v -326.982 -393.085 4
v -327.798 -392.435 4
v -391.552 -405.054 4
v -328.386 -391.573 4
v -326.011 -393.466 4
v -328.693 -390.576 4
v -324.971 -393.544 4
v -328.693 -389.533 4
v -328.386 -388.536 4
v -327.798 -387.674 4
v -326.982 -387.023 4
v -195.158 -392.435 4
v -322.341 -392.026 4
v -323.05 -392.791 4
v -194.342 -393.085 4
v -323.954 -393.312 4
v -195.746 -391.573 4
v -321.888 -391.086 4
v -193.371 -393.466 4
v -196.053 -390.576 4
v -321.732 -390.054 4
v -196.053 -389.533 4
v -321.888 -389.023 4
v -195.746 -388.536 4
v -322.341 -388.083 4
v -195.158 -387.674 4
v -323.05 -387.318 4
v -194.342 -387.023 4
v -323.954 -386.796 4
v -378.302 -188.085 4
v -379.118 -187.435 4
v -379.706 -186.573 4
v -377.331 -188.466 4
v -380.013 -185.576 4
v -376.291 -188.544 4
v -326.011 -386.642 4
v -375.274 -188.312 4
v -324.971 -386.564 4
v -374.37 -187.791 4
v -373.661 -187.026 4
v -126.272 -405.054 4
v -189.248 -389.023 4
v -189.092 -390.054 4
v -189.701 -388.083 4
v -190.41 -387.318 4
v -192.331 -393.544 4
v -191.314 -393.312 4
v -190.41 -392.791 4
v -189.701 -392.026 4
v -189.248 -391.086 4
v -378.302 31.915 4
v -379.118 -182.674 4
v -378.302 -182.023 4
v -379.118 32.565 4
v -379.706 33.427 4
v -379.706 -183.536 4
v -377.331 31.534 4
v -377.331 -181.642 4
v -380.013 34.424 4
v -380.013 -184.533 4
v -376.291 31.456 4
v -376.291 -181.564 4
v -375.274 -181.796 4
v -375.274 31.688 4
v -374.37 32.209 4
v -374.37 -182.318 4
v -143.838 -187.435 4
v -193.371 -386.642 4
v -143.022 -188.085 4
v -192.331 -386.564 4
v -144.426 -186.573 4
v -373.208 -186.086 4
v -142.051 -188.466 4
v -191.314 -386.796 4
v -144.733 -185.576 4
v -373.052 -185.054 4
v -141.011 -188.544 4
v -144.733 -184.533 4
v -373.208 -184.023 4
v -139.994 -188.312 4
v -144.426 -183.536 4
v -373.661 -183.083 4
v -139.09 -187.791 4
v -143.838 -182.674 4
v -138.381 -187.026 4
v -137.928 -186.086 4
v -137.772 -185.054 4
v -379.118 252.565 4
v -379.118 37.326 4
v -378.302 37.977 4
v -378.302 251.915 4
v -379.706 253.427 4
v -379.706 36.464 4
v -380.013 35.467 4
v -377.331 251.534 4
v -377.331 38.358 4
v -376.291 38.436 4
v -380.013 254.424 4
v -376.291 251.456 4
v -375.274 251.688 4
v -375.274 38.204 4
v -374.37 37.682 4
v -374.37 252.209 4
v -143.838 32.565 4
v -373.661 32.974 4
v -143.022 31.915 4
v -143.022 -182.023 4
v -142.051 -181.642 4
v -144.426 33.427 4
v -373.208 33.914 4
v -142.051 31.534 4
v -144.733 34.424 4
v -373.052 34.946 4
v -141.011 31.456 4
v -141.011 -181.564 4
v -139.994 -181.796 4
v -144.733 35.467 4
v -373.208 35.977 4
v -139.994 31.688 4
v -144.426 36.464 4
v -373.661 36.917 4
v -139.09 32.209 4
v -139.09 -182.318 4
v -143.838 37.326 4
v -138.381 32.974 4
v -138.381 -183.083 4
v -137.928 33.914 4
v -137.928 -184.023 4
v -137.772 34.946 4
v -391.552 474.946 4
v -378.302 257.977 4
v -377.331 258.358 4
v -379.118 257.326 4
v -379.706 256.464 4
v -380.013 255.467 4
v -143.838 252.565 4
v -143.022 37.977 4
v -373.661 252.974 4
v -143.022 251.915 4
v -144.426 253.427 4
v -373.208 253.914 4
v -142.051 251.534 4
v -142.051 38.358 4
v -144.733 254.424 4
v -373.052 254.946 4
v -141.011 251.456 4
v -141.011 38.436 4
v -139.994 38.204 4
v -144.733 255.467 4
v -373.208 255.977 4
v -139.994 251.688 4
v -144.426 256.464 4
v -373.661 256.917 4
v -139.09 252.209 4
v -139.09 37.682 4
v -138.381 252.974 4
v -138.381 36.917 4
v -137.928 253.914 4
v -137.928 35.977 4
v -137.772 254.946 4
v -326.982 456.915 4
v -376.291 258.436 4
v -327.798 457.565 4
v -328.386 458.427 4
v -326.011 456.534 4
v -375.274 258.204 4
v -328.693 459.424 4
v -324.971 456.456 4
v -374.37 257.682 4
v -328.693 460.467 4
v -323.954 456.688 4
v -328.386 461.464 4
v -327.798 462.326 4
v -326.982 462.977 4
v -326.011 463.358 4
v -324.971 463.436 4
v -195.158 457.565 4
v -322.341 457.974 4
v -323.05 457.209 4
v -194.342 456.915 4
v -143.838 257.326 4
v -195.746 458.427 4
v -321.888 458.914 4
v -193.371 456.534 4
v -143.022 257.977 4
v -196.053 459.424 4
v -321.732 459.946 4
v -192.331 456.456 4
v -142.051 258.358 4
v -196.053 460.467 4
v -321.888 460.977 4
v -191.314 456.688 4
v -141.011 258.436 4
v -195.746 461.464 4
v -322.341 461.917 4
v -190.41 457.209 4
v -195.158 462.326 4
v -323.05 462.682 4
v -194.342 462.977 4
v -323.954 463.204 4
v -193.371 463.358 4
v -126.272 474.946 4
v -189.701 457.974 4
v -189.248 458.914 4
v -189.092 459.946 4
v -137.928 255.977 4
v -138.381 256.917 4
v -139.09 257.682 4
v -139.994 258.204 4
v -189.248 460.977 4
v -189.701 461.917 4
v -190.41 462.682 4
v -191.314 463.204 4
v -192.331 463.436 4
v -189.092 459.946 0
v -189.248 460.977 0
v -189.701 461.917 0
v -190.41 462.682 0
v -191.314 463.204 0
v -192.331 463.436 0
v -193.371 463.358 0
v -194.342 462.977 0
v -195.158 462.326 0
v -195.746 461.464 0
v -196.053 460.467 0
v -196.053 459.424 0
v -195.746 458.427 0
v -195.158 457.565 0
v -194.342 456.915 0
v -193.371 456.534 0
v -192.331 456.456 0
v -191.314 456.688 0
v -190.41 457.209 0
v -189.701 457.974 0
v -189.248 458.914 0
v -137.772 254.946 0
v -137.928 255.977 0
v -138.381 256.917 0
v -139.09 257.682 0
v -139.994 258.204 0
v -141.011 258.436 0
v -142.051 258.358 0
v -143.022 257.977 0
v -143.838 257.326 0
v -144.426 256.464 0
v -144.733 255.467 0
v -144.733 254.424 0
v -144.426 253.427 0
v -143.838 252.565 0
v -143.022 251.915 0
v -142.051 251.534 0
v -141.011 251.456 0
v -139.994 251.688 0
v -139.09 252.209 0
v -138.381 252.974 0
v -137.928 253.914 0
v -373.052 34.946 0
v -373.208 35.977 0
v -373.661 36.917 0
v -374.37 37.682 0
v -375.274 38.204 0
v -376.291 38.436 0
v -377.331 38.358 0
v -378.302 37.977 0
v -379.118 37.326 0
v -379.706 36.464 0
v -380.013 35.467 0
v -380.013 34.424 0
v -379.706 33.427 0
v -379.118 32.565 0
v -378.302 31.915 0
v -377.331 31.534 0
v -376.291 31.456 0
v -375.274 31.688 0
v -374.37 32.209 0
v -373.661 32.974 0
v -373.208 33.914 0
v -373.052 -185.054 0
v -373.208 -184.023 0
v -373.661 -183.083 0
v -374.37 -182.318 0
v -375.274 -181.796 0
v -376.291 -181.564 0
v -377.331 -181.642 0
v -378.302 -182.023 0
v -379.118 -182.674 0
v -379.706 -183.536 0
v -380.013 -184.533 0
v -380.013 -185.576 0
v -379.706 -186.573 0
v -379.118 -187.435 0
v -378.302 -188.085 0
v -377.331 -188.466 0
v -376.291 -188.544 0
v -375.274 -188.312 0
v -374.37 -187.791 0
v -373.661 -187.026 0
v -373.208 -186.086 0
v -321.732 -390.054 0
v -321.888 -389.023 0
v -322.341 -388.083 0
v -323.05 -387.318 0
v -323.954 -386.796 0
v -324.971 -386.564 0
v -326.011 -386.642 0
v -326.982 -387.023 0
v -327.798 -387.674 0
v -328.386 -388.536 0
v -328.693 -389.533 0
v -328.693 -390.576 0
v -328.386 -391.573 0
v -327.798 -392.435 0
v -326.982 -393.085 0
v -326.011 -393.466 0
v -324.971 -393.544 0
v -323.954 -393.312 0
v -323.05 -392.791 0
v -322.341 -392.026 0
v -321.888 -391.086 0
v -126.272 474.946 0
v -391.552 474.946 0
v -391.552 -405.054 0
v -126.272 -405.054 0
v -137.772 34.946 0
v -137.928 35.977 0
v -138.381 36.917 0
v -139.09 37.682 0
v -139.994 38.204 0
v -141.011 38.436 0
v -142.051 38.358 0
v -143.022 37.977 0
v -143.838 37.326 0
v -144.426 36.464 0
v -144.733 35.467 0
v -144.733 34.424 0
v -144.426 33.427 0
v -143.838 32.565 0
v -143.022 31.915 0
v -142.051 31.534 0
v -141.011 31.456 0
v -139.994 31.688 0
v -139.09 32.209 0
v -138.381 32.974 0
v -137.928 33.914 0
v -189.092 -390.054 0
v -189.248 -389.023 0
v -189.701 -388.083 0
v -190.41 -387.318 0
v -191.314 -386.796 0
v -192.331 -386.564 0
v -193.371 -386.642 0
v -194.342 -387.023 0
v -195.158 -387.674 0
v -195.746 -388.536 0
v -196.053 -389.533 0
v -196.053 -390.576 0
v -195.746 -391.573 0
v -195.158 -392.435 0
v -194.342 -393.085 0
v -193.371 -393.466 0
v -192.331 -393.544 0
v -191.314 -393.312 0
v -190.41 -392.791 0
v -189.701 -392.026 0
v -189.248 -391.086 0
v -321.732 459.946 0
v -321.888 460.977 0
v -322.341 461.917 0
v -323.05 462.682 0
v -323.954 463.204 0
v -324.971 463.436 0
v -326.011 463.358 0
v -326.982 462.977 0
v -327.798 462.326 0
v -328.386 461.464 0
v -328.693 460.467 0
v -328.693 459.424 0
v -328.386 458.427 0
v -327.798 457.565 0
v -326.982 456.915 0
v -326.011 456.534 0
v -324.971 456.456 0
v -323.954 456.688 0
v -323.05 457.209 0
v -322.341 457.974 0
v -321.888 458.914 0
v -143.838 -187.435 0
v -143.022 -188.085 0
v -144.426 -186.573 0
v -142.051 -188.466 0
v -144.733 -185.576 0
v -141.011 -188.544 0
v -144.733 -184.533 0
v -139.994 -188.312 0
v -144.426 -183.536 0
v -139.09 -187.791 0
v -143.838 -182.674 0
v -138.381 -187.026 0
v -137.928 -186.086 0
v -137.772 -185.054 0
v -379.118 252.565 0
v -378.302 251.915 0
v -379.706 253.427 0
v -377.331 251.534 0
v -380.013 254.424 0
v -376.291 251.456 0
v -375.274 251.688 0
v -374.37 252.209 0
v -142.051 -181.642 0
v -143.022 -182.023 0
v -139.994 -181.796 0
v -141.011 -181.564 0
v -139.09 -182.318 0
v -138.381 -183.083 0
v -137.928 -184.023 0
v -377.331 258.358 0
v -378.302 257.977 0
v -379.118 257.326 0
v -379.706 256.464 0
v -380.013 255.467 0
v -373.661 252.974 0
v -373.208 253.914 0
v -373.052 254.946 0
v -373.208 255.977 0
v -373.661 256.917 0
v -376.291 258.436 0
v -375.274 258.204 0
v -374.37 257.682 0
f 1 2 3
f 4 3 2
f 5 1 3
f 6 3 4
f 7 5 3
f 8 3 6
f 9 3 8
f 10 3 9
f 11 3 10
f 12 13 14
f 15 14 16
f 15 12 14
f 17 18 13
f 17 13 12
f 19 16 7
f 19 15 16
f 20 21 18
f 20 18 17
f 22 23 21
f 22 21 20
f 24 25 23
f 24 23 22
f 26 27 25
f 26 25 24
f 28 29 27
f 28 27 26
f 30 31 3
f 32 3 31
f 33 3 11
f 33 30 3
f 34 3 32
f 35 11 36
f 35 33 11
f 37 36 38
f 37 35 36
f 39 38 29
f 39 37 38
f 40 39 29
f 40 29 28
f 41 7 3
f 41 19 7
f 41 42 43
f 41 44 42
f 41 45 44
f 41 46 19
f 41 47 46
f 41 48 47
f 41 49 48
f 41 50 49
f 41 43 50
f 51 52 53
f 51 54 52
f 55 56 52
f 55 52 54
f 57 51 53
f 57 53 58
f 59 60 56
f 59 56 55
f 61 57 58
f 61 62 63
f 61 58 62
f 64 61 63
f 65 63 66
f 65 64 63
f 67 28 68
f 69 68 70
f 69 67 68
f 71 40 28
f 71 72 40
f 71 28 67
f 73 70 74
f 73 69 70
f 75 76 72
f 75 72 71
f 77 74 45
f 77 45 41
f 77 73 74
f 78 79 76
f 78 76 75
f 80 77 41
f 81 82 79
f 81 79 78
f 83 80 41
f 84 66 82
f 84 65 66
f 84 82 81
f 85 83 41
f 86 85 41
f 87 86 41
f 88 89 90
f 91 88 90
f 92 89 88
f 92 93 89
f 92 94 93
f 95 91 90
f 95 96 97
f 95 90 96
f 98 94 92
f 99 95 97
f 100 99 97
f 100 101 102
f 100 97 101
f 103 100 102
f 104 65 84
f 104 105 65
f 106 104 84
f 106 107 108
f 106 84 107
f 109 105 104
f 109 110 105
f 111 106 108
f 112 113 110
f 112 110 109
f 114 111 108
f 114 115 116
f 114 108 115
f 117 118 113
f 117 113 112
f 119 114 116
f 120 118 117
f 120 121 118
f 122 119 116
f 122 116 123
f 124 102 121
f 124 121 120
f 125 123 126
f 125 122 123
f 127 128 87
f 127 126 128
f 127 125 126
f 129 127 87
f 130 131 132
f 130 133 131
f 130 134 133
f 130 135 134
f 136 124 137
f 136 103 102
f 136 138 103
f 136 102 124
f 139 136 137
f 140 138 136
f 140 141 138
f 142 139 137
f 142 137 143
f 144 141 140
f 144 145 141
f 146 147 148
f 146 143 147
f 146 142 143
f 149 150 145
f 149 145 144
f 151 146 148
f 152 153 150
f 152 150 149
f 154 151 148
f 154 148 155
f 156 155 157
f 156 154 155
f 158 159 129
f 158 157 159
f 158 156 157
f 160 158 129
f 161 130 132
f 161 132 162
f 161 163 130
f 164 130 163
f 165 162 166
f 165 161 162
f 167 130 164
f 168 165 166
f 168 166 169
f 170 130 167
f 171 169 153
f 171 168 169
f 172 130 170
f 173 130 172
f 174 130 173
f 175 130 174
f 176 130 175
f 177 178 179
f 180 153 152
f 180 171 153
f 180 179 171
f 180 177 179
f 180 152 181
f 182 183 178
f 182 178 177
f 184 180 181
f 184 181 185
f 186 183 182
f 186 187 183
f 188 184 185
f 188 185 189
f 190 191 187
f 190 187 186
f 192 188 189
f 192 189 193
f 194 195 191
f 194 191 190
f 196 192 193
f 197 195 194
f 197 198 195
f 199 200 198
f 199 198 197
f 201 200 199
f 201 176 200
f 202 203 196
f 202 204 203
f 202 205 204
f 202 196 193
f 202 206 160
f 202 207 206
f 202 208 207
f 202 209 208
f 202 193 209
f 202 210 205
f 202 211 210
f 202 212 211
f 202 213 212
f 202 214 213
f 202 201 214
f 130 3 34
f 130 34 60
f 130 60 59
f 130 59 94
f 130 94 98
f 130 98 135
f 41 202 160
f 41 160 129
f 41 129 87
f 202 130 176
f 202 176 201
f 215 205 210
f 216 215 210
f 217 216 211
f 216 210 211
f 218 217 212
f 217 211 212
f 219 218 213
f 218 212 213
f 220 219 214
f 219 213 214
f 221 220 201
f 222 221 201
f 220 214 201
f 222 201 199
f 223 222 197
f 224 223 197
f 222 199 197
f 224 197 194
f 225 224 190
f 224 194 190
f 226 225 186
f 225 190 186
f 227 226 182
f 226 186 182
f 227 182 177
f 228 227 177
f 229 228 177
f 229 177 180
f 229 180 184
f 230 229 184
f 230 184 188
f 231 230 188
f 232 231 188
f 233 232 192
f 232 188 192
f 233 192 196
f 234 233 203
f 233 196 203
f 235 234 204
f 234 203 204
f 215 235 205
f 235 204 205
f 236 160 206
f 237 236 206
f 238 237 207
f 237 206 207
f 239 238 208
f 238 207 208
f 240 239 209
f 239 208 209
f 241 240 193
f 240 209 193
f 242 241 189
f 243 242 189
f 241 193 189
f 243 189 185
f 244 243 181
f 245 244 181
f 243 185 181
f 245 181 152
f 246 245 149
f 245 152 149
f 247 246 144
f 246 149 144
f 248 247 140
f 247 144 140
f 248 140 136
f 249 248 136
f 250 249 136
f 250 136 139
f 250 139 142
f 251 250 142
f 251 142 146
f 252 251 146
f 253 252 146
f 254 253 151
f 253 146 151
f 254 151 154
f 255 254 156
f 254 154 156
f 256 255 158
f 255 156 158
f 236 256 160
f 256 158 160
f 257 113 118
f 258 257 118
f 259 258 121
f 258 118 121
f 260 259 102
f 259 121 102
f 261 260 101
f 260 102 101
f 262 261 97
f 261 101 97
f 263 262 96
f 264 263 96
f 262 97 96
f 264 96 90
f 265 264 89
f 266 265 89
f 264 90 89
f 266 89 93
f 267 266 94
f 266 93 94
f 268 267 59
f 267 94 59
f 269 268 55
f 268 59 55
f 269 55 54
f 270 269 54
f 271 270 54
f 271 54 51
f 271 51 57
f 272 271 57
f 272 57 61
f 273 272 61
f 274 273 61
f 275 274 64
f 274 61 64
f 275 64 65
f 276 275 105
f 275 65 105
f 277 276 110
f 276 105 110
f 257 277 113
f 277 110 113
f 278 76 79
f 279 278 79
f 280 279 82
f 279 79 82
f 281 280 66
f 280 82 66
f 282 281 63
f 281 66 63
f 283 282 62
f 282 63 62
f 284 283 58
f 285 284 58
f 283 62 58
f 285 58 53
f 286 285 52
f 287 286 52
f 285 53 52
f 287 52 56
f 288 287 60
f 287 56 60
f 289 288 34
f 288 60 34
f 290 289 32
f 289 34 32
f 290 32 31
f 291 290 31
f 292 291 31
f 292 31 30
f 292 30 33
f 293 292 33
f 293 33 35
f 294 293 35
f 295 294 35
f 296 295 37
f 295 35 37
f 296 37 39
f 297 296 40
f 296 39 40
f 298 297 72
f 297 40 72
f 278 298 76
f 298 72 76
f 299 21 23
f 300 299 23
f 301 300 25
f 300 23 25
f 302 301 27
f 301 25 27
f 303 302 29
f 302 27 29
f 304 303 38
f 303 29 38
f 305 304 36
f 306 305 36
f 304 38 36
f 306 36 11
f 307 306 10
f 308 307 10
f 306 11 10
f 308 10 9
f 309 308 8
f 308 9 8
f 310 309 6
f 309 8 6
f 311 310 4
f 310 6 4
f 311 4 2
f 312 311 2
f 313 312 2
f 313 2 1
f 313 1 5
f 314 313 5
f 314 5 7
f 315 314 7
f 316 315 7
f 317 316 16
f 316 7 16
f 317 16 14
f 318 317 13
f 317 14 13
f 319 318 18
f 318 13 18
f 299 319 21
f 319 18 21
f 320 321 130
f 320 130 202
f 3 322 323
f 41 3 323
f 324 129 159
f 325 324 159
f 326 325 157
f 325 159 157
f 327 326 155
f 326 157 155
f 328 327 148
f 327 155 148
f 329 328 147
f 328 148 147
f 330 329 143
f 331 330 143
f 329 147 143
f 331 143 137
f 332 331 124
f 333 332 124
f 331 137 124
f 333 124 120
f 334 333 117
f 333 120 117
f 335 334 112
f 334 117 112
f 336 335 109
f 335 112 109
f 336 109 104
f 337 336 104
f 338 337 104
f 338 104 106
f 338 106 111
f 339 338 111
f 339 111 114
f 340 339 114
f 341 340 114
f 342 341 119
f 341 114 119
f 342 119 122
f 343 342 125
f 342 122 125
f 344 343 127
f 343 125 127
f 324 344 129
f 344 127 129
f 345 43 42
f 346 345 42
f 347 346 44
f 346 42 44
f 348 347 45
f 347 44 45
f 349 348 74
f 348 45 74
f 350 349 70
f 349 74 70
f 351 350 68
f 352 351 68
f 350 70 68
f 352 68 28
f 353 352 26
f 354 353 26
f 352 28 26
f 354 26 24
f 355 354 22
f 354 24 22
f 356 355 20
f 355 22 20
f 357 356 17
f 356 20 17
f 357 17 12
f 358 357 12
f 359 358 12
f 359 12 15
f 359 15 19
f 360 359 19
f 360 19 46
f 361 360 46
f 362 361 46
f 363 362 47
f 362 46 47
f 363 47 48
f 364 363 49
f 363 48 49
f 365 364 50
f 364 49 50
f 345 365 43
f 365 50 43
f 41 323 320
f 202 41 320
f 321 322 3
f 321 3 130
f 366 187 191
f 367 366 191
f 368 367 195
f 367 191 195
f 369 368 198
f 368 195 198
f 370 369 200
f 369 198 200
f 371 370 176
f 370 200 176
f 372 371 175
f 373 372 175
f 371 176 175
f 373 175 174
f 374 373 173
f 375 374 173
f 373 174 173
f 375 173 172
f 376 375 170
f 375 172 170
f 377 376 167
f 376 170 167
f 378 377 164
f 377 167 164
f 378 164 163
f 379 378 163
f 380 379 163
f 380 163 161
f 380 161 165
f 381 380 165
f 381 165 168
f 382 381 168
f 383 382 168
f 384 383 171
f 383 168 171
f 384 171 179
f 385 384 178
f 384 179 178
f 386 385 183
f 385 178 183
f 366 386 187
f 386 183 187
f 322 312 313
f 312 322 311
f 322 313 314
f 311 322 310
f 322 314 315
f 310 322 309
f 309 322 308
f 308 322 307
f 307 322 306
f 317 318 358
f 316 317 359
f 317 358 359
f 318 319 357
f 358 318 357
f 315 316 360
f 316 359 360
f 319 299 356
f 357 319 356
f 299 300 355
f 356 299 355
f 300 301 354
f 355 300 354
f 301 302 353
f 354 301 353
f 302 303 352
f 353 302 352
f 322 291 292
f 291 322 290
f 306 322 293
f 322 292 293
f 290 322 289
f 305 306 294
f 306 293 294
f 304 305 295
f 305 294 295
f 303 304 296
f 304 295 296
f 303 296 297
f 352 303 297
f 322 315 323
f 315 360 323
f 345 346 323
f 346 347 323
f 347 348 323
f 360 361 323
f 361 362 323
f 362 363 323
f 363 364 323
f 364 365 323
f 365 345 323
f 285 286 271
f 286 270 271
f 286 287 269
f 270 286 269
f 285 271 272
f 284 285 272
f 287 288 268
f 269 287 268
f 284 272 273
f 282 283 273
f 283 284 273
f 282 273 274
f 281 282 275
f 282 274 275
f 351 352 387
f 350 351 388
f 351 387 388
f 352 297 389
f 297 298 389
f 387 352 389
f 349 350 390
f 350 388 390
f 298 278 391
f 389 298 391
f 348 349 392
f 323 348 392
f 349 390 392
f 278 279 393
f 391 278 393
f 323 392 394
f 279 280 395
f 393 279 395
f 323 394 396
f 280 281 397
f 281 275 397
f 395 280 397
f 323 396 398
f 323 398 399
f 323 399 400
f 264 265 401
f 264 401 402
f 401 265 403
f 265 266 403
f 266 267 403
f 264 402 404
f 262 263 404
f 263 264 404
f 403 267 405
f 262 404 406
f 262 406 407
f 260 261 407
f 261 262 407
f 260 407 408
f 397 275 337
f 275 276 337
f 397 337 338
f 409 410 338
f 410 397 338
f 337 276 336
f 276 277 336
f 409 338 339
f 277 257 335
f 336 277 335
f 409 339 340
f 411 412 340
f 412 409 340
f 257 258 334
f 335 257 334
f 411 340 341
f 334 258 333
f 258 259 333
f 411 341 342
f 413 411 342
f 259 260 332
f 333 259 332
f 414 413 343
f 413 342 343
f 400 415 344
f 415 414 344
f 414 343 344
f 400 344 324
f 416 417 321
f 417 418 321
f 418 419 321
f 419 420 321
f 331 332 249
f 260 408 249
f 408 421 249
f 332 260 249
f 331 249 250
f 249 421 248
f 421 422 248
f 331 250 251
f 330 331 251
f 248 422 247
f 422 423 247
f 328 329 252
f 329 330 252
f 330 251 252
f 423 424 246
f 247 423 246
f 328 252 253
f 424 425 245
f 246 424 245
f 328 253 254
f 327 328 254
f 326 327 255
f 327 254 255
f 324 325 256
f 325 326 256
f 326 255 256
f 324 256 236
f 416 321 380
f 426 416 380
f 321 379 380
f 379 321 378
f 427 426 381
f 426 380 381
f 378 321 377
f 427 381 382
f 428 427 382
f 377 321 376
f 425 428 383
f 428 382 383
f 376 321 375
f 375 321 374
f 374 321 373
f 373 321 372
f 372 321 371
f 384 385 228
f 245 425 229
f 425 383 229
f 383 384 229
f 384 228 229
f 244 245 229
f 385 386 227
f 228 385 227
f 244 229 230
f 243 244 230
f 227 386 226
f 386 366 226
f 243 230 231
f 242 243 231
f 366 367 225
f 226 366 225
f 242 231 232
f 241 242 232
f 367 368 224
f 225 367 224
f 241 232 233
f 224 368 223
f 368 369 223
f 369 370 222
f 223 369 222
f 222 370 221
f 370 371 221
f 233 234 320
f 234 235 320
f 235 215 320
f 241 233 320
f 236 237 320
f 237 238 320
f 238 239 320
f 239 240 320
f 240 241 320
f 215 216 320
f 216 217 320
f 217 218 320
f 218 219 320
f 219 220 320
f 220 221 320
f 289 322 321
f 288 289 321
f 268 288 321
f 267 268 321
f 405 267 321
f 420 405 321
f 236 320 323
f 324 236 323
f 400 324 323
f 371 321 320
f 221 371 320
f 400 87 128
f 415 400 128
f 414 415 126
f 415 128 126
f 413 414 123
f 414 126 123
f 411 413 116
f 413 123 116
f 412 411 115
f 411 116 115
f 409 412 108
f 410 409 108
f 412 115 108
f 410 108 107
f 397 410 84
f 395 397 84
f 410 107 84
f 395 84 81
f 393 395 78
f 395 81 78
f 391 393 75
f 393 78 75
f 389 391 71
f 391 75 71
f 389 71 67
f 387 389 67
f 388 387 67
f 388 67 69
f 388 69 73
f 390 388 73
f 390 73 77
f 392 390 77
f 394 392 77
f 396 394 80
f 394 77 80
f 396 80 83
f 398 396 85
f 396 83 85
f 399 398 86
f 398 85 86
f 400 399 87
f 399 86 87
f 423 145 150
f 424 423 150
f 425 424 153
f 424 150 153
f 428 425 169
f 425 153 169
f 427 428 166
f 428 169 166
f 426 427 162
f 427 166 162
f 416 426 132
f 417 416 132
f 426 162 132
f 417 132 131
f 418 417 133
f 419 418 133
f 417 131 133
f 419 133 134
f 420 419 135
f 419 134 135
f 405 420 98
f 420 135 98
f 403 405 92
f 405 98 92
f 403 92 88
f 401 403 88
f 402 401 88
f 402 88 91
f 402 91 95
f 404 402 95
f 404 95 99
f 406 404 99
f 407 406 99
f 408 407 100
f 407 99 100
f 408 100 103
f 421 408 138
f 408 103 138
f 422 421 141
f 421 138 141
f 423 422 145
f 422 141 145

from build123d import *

# Parameters (mm, degrees)
SKETCH1_W           = 265.28
SKETCH1_H           = 880
BOSS_EXTRUDE1_DEPTH = 4
SKETCH2_R           = 3.5
CUT_EXTRUDE1_DEPTH  = 4


with BuildPart() as part:
    # Sketch1 → Boss-Extrude1 (new body)
    with BuildSketch(Plane.XY):
        with Locations((-258.91234657, 34.945848375)):
            Rectangle(SKETCH1_W, SKETCH1_H)
    extrude(amount=BOSS_EXTRUDE1_DEPTH)

    # Sketch2 → Cut-Extrude1 (cut)
    with BuildSketch(Plane.XY.offset(4)):
        with Locations((-325.23234657, 459.945848375)):
            Circle(SKETCH2_R)
        with Locations((-192.59234657, 459.945848375)):
            Circle(SKETCH2_R)
        with Locations((-325.23234657, -390.054151625)):
            Circle(SKETCH2_R)
        with Locations((-192.59234657, -390.054151625)):
            Circle(SKETCH2_R)
        with Locations((-376.55234657, 254.945848375)):
            Circle(SKETCH2_R)
        with Locations((-376.55234657, -185.054151625)):
            Circle(SKETCH2_R)
        with Locations((-141.27234657, -185.054151625)):
            Circle(SKETCH2_R)
        with Locations((-141.27234657, 254.945848375)):
            Circle(SKETCH2_R)
        with Locations((-376.55234657, 34.945848375)):
            Circle(SKETCH2_R)
        with Locations((-141.27234657, 34.945848375)):
            Circle(SKETCH2_R)
    extrude(amount=-CUT_EXTRUDE1_DEPTH, mode=Mode.SUBTRACT)


solid = part.part
